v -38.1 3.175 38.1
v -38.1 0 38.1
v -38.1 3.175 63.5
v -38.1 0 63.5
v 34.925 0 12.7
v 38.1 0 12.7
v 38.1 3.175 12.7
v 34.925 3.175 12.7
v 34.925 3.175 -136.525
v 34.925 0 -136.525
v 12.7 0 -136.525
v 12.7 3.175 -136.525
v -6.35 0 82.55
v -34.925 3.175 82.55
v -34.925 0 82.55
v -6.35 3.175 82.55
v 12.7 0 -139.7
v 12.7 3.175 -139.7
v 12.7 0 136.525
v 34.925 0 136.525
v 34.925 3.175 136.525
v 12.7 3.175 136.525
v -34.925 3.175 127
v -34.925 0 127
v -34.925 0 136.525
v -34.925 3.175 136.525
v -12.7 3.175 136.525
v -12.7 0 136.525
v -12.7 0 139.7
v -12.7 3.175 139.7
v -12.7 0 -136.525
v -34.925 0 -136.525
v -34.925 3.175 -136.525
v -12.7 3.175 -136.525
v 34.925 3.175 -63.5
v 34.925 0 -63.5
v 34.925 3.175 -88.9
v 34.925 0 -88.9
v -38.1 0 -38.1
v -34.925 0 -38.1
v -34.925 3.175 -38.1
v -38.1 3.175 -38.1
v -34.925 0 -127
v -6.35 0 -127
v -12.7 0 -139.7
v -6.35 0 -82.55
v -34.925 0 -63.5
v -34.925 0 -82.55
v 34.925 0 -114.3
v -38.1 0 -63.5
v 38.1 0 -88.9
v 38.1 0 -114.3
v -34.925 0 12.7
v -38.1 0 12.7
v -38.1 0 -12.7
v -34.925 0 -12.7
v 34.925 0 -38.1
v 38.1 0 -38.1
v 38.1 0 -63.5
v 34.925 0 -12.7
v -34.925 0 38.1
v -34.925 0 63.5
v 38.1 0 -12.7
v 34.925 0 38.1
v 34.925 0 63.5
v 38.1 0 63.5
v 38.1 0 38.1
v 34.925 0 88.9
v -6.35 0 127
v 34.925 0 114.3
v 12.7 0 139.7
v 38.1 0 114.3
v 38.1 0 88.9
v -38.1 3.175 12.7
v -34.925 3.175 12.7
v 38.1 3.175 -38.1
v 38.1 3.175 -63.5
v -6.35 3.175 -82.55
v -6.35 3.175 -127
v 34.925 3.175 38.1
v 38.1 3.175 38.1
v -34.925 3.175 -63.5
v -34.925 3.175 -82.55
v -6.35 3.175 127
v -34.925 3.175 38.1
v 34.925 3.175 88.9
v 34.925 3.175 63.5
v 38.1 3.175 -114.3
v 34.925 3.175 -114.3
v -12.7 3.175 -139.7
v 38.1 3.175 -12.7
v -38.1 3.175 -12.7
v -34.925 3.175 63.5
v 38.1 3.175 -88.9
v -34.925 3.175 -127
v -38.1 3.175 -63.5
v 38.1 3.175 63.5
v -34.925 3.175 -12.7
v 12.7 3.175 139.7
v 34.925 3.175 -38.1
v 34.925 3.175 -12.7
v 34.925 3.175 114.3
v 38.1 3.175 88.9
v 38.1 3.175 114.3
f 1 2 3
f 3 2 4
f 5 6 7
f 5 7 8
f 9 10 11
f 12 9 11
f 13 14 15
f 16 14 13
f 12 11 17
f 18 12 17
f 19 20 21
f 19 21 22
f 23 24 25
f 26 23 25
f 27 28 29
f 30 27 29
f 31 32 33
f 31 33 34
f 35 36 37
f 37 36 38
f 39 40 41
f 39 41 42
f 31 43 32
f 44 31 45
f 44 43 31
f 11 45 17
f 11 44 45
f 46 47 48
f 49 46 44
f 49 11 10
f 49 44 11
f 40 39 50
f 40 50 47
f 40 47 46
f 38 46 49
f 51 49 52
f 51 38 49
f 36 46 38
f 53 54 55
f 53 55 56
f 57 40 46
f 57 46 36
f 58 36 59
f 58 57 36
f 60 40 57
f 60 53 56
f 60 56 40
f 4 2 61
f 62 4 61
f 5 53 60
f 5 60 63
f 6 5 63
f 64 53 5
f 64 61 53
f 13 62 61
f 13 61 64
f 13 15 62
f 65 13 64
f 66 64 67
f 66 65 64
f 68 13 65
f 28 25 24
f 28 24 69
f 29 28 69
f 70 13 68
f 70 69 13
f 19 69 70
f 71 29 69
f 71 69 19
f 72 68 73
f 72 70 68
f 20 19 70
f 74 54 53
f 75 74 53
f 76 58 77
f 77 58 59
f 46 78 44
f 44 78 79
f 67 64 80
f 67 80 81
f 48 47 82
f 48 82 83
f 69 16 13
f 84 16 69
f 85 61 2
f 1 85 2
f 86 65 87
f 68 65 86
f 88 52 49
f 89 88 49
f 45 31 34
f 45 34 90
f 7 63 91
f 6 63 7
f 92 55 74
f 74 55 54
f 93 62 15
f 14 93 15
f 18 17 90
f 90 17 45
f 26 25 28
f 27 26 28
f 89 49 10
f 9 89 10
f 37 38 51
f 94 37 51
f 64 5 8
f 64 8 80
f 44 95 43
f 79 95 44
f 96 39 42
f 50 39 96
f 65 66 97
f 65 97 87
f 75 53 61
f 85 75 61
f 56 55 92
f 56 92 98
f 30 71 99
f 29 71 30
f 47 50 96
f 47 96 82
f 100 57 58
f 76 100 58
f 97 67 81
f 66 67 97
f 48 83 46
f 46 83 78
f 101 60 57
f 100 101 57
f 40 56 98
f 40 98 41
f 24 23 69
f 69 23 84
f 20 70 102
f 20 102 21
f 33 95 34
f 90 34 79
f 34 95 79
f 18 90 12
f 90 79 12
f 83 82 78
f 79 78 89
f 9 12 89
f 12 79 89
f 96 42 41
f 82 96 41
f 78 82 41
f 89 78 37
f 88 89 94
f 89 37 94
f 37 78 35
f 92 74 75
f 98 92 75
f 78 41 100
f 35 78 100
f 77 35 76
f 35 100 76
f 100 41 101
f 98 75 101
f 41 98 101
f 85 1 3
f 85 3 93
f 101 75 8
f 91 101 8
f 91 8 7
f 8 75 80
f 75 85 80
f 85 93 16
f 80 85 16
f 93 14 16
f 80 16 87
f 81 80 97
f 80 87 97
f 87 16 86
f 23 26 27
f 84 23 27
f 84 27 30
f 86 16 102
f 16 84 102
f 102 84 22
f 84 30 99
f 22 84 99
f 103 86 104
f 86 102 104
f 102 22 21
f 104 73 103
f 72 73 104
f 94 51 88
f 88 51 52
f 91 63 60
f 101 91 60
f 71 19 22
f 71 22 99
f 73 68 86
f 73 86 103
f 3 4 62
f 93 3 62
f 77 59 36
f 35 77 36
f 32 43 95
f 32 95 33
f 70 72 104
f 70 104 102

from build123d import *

# Parameters (mm, degrees)
BOSS_EXTRUDE1_DEPTH     = 3.175
SKETCH2_W               = 31.75
SKETCH2_H               = 44.45
CUT_EXTRUDE1_DEPTH      = 1
CUT_EXTRUDE1_DEPTH_BACK = 4.175


with BuildPart() as part:
    # Sketch1 → Boss-Extrude1 (new body)
    with BuildSketch(Plane(origin=(0, 0, 0), x_dir=(1, 0, 0), z_dir=(0, 1, 0))):
        Polygon((0, 0), (-38.1, 0), (-38.1, 12.7), (-34.925, 12.7), (-34.925, 38.1), (-38.1, 38.1), (-38.1, 63.5), (-34.925, 63.5), (-34.925, 88.9), (-38.1, 88.9), (-38.1, 114.3), (-34.925, 114.3), (-34.925, 136.525), (-12.7, 136.525), (-12.7, 139.7), (0, 139.7), align=None)
    extrude(amount=BOSS_EXTRUDE1_DEPTH)

    # Mirror1: part across plane


with BuildPart() as part_1:
    add(part.part)
    add(part.part.mirror(Plane(origin=(0, 3.175, 0), x_dir=(0, 0, 1), z_dir=(-1, 0, 0))))

    # Sketch2 → Cut-Extrude1 (cut, two sides)
    with BuildSketch(Plane(origin=(0, 3.175, 0), x_dir=(1, 0, 0), z_dir=(0, 1, 0))) as cut_extrude1_sk:
        with Locations((-22.225, 104.775)):
            Rectangle(SKETCH2_W, SKETCH2_H)
    extrude(amount=CUT_EXTRUDE1_DEPTH, mode=Mode.SUBTRACT)
    extrude(cut_extrude1_sk.sketch, amount=-CUT_EXTRUDE1_DEPTH_BACK, mode=Mode.SUBTRACT)

    # Mirror2: part across plane


with BuildPart() as part_2:
    add(part_1.part)
    add(part_1.part.mirror(Plane(origin=(0, 3.175, 0), x_dir=(1, 0, 0), z_dir=(0, 0, 1))))


solid = part_2.part
